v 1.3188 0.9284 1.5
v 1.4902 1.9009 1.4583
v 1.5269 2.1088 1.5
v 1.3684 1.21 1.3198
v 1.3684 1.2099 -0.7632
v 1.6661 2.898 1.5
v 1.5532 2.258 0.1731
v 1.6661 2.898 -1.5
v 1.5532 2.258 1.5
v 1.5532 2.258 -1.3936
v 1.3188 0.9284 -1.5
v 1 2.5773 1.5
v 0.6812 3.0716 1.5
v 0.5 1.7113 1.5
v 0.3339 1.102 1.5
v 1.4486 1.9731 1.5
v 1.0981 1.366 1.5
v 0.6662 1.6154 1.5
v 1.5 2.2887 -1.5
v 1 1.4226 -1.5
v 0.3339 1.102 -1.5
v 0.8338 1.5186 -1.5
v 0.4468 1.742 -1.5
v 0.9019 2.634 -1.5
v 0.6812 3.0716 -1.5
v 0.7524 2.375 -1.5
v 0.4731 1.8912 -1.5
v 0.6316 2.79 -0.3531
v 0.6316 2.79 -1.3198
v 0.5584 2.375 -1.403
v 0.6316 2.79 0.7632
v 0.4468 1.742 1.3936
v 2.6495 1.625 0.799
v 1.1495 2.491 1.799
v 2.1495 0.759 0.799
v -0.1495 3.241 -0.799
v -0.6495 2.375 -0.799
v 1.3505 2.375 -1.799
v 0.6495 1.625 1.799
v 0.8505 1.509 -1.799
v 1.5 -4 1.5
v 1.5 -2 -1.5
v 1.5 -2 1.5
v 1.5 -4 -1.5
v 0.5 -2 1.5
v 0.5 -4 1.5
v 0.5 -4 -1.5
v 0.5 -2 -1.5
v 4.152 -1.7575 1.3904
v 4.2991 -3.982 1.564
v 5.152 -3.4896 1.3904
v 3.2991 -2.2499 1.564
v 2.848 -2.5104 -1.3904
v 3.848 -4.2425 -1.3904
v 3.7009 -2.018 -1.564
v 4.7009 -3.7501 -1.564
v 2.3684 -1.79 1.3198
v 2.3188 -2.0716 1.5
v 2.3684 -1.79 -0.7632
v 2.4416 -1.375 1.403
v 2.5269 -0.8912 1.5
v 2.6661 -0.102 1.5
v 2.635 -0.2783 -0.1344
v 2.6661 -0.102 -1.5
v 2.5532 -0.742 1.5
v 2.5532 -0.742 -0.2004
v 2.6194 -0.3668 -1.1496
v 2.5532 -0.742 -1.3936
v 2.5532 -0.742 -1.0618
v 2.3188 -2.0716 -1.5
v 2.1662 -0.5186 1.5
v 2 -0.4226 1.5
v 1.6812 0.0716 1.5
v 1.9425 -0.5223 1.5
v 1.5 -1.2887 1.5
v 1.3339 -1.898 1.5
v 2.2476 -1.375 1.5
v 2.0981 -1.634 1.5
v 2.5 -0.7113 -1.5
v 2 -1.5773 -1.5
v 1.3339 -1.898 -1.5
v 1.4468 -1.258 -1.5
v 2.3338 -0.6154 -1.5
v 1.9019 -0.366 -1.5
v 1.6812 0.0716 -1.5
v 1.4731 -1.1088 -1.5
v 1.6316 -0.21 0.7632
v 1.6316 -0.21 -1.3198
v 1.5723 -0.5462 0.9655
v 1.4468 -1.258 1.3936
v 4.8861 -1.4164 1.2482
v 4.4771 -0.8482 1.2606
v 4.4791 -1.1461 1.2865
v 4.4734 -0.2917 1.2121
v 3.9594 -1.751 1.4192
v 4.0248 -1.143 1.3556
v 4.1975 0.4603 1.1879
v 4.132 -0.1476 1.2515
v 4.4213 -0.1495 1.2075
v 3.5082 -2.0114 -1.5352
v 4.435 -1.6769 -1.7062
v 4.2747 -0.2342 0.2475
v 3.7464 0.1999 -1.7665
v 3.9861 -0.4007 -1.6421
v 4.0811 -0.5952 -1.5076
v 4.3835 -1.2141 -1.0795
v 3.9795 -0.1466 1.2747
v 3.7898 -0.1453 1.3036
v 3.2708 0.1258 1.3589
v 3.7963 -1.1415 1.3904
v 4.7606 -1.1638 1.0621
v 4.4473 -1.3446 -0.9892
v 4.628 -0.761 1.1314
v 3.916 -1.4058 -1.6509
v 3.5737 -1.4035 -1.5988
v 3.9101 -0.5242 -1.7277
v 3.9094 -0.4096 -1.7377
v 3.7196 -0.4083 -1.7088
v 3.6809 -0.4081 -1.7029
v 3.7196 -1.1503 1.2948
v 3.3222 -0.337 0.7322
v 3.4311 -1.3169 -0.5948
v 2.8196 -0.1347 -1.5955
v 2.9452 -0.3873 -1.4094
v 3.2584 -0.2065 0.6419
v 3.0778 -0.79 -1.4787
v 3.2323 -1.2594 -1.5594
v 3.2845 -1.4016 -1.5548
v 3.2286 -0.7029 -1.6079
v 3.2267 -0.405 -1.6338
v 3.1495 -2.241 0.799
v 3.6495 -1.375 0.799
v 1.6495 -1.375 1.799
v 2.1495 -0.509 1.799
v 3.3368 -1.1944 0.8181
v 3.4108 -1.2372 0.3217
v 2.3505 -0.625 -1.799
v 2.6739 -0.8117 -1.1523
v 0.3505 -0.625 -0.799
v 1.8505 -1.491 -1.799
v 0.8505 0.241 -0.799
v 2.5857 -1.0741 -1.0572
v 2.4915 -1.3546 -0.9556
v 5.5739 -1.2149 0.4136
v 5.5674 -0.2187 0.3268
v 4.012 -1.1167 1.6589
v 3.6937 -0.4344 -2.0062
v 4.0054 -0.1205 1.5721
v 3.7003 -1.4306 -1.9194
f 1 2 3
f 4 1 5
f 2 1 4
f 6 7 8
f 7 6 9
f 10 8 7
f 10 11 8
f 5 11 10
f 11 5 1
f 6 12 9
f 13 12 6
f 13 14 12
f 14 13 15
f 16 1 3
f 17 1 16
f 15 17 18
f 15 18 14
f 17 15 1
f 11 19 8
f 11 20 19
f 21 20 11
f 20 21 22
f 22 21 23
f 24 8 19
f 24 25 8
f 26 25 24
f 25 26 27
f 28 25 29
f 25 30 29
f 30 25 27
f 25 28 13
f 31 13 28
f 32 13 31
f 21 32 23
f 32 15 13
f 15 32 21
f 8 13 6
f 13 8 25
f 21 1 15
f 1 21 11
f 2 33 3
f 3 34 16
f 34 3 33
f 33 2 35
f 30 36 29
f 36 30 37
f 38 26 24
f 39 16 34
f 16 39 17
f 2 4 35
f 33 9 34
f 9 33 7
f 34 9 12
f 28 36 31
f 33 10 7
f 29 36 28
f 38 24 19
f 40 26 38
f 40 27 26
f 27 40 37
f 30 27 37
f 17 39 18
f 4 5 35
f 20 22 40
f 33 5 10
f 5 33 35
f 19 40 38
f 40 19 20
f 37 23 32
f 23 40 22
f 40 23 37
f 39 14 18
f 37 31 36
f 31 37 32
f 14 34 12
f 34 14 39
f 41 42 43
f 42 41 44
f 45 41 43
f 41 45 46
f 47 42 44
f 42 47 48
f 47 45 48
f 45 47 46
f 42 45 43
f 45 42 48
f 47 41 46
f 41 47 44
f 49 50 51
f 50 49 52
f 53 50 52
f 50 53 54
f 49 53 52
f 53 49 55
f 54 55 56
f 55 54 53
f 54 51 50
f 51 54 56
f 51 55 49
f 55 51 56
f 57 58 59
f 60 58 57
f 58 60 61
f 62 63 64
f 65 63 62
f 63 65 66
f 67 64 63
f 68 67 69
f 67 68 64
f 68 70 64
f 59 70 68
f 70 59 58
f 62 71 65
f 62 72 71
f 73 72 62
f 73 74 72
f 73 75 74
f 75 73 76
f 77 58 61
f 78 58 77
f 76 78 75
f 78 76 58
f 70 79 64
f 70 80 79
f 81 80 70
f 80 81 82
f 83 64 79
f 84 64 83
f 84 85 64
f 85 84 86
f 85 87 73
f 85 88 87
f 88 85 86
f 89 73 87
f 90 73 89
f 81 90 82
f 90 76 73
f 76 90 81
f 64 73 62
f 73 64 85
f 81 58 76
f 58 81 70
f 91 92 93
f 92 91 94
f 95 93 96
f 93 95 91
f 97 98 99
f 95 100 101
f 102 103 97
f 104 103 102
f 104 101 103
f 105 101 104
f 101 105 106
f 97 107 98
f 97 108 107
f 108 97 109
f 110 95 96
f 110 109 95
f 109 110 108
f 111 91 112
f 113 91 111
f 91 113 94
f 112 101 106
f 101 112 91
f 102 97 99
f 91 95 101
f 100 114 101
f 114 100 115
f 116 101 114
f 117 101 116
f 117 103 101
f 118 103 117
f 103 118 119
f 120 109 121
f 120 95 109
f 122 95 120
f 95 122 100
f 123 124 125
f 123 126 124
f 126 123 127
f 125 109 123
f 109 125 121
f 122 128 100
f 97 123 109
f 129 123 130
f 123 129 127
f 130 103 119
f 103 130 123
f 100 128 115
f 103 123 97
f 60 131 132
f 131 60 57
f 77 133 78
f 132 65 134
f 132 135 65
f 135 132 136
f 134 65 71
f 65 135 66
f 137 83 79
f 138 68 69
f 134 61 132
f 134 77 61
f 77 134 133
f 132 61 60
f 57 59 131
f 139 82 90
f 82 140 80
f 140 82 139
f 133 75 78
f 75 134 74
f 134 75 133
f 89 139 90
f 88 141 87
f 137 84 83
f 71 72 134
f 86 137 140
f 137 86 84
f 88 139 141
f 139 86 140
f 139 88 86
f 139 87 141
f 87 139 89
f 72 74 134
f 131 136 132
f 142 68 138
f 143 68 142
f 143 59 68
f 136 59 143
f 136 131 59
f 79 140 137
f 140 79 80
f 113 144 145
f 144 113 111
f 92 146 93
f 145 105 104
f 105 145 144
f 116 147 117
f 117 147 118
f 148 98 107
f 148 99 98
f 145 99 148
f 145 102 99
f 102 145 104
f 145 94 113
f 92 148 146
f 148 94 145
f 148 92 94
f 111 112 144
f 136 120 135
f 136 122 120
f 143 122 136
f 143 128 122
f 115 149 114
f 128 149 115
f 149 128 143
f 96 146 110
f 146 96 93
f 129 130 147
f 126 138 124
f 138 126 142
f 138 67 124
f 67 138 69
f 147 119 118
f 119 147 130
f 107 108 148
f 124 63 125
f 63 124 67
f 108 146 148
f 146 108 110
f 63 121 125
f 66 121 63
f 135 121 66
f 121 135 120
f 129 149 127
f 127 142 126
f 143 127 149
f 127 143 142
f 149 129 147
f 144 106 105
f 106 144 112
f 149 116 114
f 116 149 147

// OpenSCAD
// ### Usage #########################################################
orient1 = 
  [
    [[1, 2], [-10]],
    [[1, 2, 0], [30, 0, 60]]
  ];
orient2 =
  [
    [[1, -3], 0],
    [[4, -3, 0], [0, 10, 30]]
  ];
composite = composite(orient2, orient1);
echo(composite);

color("Blue")
layout(orient1)
cube([1, 2, 3], center = true);

color("Red")
layout(orient2)
cube([1, 2, 3], center = true);

layout(composite(orient2, orient1))
cube([1, 2, 3], center = true);

// Pad vectors
echo(pad_to_n_vector(0, n = 3));
echo(pad_to_n_vector(1, n = 3));
echo(pad_to_n_vector([2], n = 3));
echo(pad_to_n_vector([3, 4], n = 3));
echo(pad_to_n_vector([5, 6, 7, 8], n = 3));
echo(pad_to_n_vector([9], n = 3, pad_left = true));


// ### Module ########################################################

// Using the 6DOF coordinate data in `data`, replicate the children modules
// Data formated as:
//    [
//      [[x, y, z], [phi, theta, psi]],
//      [[x, y, z], [phi, theta, psi]],
//      [[x, y], [psi]],
//      [[x, y], [psi]],
//      [[x, y], psi],
//      [[x, y], psi],
//      ...
//    ]
module layout(data) {
  for ( icoord = data ) {
    if ( len(icoord[0]) == 3 && len(icoord[1]) == 3 ) {
      // (3D) 3-Vector Translation & 3-Vector Rotation
      translate([icoord[0].x, icoord[0].y, icoord[0].z])
      rotate([icoord[1].x, icoord[1].y, icoord[1].z])
      children();
    } else if ( len(icoord[0]) == 2 && is_num(icoord[1])) {
      // (2D) 2-Vector Translation & Scalar Rotation
      translate([icoord[0].x, icoord[0].y])
      rotate(icoord[1])
      children();
    } else if ( len(icoord[0]) == 2 && len(icoord[1]) == 1) {
      // (2D) 2-Vector Translation & 1-Vector Rotation
      translate([icoord[0].x, icoord[0].y])
      rotate(icoord[1][0])
      children();
    } else {
      assert(false, "Input coordinates not supported in layout() module");
    }
  }
}


// Apply the orientation of the first argument to the orientation of the second
// I.e., the orientation of an object placed at orient1 and the result subsequently
// placed via orient2 may be given as
//    composite(orient2, orient1)
// The resulting vector will have a length as long as the product of the two argument lengths
function composite(o2, o1) =
  [
    for ( i1 = [ 0 : len(o1) - 1 ], i2 = [ 0 : len(o2) - 1 ] )
    // Input Sanitation - Get 3-vectors
    let( r1 = pad_to_n_vector( o1[i1][0], n = 3 ) )
    let( a1 = pad_to_n_vector( o1[i1][1], n = 3, pad_left = true ) )
    let( r2 = pad_to_n_vector( o2[i2][0], n = 3 ) )
    let( a2 = pad_to_n_vector( o2[i2][1], n = 3, pad_left = true ) )

    let( Orient = rotation_matrix(a2) )
    [
      r1 * Orient + r2,
      euler_angles(rotation_matrix(a1) * Orient)
    ]
  ];


// Groves (2.22)
function rotation_matrix(euler) =
  let( sPhi = sin(euler.x) )
  let( cPhi = cos(euler.x) )
  let( sThe = sin(euler.y) )
  let( cThe = cos(euler.y) )
  let( sPsi = sin(euler.z) )
  let( cPsi = cos(euler.z) )
  [
    [                  cThe*cPsi,                   cThe*sPsi,     -sThe],
    [-cPhi*sPsi + sPhi*sThe*cPsi,  cPhi*cPsi + sPhi*sThe*sPsi, sPhi*cThe],
    [ sPhi*sPsi + cPhi*sThe*cPsi, -sPhi*cPsi + cPhi*sThe*sPsi, cPhi*cThe]
  ];


// Groves (2.23)
function euler_angles(rotation_matrix) =
  [
    atan2(rotation_matrix[1][2], rotation_matrix[2][2]), // phi,   roll
    -asin(rotation_matrix[0][2]),                        // theta, pitch
    atan2(rotation_matrix[0][1], rotation_matrix[0][0])  // psi,   yaw
  ];


// Add elements to a number or vector to create a vector of the desired length
function pad_to_n_vector(v, n = 3, pad_left = false) = 
  let( vector = is_list(v) ? v : [v] )
  let( n_vector = 
    len(vector) >= n 
      ? vector
      : pad_left
        ? concat([0], pad_to_n_vector(vector, n = n-1, pad_left = pad_left))
        : concat(pad_to_n_vector(vector, n = n-1, pad_left = pad_left), [0])
  )
  n_vector;
